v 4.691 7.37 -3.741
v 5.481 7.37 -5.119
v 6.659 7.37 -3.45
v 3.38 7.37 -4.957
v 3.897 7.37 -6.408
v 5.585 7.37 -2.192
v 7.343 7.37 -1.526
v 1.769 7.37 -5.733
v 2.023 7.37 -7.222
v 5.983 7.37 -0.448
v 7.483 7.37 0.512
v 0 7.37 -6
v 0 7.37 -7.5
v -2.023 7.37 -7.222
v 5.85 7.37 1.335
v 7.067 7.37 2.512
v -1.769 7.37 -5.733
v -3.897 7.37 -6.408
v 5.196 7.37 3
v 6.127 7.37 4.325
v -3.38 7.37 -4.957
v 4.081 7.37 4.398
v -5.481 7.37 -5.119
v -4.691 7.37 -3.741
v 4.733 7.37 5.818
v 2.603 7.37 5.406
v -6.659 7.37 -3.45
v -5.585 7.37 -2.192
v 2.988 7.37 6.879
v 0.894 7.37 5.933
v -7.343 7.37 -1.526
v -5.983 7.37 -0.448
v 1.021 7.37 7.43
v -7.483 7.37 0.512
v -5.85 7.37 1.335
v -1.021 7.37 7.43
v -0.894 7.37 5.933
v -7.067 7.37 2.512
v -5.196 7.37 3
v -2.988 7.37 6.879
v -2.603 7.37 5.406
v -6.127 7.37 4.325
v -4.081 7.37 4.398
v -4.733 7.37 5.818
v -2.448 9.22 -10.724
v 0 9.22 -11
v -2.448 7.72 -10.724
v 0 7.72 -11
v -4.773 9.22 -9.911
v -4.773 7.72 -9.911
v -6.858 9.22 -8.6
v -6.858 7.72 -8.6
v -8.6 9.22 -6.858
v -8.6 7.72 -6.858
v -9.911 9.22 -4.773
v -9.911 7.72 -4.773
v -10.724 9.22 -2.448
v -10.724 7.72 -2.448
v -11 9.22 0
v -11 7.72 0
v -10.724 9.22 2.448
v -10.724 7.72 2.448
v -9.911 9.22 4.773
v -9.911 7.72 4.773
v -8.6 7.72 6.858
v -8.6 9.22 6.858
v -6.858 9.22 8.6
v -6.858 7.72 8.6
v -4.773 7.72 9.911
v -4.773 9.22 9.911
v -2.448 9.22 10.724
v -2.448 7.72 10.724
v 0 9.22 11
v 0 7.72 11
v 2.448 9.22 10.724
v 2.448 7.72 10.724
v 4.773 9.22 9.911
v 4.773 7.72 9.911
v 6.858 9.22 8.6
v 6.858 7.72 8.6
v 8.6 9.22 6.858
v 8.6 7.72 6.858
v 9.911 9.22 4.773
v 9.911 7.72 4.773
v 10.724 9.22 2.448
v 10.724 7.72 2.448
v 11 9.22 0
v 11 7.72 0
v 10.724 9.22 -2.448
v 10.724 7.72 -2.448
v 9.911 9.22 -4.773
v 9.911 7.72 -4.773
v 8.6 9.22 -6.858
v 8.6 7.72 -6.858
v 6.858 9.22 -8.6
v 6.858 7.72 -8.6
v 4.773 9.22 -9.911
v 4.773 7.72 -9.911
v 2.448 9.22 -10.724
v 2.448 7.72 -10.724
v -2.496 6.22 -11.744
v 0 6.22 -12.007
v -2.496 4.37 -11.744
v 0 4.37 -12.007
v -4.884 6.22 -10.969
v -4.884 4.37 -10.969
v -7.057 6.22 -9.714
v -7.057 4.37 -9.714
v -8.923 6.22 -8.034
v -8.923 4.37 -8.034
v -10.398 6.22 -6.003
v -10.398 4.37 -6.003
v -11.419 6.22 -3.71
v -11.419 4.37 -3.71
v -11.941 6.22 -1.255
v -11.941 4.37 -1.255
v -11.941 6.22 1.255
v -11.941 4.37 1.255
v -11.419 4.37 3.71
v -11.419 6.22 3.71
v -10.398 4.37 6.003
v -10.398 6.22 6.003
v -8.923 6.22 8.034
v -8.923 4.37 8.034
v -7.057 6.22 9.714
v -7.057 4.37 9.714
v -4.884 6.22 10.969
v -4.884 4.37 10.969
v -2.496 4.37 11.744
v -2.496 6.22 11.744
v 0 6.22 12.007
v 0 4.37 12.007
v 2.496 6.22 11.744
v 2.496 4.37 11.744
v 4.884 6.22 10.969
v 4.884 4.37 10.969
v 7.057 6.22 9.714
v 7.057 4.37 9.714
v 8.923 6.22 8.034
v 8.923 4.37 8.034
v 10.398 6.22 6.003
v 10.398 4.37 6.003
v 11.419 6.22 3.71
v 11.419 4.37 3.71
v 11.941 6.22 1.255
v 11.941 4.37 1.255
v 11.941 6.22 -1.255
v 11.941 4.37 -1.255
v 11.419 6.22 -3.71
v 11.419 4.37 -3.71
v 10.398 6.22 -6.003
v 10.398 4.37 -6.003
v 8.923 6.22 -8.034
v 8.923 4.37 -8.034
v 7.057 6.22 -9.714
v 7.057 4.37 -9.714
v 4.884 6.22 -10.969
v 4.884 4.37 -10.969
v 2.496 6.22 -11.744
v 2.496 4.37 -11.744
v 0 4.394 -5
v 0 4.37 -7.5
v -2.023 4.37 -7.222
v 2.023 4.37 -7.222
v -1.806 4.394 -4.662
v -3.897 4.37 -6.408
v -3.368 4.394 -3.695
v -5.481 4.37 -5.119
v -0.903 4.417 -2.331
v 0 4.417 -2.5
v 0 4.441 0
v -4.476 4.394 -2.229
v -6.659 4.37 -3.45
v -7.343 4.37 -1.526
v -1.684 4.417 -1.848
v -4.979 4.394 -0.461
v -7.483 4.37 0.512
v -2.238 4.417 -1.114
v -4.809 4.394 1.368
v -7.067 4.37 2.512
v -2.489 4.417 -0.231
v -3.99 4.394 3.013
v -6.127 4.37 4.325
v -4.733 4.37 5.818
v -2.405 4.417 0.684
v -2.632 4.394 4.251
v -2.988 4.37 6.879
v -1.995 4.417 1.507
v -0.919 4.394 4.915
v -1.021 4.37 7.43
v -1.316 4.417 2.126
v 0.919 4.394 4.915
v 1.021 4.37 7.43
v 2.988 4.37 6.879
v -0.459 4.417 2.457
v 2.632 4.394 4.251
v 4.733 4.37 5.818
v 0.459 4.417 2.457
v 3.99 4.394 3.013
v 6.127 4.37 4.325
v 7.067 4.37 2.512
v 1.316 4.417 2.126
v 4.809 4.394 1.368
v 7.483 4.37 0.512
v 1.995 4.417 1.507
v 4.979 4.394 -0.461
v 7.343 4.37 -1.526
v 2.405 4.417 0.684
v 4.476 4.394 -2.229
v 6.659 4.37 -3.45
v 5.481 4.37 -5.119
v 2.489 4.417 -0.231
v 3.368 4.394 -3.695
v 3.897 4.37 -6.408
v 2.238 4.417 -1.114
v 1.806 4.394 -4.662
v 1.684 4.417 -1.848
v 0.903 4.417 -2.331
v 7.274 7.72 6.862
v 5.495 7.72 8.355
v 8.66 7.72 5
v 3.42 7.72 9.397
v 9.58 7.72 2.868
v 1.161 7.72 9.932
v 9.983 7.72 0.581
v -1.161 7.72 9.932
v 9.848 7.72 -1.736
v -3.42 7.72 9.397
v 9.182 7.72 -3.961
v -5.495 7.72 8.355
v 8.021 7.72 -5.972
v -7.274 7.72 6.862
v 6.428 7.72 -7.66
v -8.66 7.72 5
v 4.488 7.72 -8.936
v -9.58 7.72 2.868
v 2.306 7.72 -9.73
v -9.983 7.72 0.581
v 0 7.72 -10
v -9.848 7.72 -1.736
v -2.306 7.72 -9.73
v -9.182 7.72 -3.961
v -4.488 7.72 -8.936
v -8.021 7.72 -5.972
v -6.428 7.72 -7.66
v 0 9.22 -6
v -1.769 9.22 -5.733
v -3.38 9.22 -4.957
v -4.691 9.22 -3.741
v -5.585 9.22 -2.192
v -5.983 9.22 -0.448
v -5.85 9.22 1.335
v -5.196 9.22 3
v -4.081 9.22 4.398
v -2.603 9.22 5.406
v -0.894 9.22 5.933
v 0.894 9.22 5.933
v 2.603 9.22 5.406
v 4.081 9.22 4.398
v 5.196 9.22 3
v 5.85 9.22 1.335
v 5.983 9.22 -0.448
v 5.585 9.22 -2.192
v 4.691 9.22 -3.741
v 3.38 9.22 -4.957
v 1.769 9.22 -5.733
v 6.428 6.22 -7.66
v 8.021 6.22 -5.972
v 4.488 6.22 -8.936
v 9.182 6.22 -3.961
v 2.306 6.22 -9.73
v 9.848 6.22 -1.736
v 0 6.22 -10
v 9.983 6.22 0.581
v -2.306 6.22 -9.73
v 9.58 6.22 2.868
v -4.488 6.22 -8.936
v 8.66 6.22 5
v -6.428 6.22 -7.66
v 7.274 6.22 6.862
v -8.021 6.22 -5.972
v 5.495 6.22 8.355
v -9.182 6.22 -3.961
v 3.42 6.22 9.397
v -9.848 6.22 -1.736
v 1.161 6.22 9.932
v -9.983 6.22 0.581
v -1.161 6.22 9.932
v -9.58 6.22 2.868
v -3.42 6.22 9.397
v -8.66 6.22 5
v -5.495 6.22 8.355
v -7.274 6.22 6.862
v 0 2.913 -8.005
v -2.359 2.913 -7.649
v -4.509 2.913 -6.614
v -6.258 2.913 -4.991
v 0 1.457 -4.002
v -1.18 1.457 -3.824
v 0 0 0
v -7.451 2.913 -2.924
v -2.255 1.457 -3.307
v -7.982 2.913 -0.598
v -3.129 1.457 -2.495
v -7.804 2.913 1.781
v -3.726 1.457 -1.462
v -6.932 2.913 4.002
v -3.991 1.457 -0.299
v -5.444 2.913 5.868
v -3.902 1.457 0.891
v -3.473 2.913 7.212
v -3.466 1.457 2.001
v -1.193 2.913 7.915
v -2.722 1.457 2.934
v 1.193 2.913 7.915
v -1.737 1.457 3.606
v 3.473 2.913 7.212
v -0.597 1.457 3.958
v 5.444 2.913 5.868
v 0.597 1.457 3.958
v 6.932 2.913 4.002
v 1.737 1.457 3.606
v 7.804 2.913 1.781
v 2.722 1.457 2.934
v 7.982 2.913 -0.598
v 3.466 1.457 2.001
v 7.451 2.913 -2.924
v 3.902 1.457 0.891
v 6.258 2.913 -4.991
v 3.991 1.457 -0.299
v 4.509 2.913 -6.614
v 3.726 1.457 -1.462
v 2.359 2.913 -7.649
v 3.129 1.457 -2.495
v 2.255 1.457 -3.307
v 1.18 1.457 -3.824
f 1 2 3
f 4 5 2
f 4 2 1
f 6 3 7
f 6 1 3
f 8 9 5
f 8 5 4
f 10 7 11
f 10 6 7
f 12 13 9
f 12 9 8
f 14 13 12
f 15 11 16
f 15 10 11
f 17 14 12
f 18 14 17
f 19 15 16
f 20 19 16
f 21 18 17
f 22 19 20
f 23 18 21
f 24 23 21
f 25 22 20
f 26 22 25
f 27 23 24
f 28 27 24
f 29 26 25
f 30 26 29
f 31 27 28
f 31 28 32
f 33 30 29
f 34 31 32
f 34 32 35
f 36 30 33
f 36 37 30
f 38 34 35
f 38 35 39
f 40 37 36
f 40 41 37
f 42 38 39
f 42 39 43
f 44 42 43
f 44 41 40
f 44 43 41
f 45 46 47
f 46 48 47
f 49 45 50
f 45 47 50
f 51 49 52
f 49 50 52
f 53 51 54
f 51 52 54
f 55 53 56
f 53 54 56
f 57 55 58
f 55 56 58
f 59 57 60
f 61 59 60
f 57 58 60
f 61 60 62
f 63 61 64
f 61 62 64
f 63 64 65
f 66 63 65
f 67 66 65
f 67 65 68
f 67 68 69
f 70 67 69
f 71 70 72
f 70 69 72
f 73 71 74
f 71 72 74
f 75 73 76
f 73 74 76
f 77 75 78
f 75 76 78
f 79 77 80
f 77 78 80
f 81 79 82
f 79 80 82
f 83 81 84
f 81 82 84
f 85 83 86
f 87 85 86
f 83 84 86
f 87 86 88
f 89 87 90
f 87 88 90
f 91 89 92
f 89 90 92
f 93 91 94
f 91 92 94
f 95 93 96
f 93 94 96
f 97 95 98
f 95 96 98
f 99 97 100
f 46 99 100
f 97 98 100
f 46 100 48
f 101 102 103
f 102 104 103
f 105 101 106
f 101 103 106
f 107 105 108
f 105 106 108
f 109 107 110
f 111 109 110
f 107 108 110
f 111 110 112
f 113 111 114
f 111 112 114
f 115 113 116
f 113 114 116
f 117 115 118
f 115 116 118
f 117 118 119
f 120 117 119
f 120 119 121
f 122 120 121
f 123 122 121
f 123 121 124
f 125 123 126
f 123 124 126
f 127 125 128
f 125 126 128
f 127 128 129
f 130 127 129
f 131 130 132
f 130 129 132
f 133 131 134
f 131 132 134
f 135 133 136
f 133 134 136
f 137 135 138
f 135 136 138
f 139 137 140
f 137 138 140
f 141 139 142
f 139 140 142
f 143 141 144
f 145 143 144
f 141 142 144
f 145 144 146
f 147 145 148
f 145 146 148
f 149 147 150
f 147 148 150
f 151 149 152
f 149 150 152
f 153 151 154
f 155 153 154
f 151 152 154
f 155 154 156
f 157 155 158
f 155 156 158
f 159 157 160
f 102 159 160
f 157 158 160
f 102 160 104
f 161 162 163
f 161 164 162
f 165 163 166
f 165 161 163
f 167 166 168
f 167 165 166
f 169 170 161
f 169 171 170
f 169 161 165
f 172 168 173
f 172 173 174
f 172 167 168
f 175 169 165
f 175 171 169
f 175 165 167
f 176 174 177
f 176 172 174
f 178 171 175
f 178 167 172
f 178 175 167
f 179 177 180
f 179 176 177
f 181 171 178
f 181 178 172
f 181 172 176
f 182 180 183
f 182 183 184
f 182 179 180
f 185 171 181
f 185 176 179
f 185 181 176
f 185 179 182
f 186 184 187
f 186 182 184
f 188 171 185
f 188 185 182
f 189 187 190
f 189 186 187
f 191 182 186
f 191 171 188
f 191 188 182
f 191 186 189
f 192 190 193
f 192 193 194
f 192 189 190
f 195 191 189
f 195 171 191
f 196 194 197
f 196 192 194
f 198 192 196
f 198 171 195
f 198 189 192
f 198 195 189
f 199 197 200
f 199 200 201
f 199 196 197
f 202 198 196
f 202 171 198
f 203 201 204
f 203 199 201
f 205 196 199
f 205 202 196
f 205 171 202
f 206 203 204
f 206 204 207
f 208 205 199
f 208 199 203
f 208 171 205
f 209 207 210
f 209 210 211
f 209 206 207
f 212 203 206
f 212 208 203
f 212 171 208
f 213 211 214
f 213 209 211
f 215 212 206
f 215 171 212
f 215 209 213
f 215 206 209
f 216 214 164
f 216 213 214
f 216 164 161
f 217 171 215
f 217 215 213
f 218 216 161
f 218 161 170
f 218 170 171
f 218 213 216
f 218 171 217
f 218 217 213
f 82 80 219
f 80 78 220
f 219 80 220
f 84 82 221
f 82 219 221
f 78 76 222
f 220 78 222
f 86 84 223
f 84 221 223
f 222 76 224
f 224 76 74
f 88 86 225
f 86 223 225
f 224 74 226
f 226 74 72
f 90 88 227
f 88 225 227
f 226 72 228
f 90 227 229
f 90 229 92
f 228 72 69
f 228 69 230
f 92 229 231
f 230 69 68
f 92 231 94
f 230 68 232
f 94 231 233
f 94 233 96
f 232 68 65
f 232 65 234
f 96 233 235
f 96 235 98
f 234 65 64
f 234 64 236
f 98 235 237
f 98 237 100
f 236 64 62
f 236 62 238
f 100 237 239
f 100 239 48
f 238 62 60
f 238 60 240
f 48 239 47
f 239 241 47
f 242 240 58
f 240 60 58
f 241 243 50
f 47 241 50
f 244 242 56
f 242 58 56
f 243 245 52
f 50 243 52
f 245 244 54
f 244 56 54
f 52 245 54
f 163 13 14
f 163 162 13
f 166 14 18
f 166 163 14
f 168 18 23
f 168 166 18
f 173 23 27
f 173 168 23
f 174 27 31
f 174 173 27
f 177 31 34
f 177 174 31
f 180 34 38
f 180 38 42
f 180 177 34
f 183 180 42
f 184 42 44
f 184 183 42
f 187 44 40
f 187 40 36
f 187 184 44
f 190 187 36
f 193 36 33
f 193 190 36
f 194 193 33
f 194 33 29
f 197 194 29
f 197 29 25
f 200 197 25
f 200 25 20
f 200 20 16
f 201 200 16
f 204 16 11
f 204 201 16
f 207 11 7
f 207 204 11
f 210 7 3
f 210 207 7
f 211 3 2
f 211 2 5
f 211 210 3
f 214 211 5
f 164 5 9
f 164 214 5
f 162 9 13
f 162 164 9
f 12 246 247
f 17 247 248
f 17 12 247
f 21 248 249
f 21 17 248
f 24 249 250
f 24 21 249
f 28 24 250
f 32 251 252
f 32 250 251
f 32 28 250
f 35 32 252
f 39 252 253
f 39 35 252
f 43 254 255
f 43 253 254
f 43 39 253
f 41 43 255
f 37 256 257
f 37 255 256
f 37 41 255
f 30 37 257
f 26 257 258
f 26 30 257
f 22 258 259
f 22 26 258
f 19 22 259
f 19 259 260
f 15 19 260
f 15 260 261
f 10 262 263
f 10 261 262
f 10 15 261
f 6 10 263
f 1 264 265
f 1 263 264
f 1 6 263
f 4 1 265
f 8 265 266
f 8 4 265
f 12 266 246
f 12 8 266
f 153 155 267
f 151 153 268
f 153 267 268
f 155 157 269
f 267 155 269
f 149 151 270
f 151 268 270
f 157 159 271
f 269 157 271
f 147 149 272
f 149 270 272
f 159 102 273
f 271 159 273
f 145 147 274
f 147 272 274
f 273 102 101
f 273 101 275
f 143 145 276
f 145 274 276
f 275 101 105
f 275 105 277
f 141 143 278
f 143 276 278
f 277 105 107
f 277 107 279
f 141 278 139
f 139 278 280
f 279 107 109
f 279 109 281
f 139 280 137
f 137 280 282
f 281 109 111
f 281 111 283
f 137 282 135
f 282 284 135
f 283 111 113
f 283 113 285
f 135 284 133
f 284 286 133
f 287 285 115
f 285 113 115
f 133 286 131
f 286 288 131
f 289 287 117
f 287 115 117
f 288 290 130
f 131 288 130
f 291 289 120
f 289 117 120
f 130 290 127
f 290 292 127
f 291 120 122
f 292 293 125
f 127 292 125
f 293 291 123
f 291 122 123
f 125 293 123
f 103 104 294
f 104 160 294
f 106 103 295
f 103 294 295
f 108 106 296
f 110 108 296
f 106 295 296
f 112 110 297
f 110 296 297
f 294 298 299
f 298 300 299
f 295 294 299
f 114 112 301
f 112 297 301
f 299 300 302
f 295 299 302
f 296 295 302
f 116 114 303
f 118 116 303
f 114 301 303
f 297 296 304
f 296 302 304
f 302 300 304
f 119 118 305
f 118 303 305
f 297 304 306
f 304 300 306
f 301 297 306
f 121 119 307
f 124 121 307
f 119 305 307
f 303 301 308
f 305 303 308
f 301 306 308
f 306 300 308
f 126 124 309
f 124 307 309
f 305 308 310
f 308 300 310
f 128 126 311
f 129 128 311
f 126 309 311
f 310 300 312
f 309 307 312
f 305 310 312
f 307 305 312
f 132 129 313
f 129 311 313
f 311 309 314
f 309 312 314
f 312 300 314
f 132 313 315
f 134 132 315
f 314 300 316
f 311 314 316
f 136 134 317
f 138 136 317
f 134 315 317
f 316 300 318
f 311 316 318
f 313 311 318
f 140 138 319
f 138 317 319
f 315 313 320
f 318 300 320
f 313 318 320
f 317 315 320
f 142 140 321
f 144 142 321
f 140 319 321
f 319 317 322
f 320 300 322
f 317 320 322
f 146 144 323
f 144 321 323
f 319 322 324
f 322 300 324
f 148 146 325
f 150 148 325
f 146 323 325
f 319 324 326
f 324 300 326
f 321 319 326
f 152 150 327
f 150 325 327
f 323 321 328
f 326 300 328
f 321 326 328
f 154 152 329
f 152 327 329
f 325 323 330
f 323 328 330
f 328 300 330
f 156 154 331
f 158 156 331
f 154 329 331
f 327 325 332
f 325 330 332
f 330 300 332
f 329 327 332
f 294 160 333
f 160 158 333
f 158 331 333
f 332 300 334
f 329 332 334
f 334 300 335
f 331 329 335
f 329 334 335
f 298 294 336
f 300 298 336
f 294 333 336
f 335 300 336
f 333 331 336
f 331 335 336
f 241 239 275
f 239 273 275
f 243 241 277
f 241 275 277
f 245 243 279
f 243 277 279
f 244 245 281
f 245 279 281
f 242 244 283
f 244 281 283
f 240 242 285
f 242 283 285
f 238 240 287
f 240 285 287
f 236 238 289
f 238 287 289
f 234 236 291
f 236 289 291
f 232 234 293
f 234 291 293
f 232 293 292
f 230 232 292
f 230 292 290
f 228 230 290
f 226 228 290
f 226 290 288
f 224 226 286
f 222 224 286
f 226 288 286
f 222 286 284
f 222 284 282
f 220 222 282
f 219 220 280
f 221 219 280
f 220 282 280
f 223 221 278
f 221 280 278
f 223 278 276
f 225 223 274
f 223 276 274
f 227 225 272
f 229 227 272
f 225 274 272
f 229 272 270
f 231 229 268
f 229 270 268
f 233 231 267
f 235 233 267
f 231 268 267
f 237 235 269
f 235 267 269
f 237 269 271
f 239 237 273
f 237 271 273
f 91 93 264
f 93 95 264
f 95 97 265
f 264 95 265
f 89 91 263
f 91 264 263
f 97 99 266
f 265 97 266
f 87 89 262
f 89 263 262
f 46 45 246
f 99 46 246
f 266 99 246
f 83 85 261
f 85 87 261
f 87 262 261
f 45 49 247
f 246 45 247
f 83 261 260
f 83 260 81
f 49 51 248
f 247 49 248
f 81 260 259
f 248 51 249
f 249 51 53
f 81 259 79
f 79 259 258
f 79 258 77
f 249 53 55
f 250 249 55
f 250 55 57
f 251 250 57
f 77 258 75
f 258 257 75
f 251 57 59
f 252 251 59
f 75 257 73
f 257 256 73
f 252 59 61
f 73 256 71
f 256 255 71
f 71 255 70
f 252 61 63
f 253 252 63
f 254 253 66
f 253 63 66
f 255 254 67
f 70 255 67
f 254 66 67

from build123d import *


with BuildPart() as part:
    # Sketch2 → Revolve1 (revolve)
    with BuildSketch(Plane.XY, mode=Mode.PRIVATE) as revolve1_sk:
        Polygon((0, 0), (0, 9.220121932), (-11, 9.220121932), (-11, 7.720121932), (-10, 7.720121932), (-10, 6.220121932), (-12.006811328, 6.220121932), (-12.006811328, 4.370121932), align=None)
    revolve(revolve1_sk.sketch.rotate(Axis((0, 0, 0), (0, 1, 0)), 270), axis=Axis((0, 0, 0), (0, 1, 0)))

    # Sketch3 → Cut-Revolve1 (revolve, cut)
    with BuildSketch(Plane.XY, mode=Mode.PRIVATE) as cut_revolve1_sk:
        Polygon((0, 4.441105813), (0, 10.370121932), (-6, 10.370121932), (-6, 7.370121932), (-7.5, 7.370121932), (-7.5, 4.370121932), align=None)
    revolve(cut_revolve1_sk.sketch.rotate(Axis((0, 4.441105813, 0), (0, 1, 0)), 270), axis=Axis((0, 4.441105813, 0), (0, 1, 0)), mode=Mode.SUBTRACT)


solid = part.part
